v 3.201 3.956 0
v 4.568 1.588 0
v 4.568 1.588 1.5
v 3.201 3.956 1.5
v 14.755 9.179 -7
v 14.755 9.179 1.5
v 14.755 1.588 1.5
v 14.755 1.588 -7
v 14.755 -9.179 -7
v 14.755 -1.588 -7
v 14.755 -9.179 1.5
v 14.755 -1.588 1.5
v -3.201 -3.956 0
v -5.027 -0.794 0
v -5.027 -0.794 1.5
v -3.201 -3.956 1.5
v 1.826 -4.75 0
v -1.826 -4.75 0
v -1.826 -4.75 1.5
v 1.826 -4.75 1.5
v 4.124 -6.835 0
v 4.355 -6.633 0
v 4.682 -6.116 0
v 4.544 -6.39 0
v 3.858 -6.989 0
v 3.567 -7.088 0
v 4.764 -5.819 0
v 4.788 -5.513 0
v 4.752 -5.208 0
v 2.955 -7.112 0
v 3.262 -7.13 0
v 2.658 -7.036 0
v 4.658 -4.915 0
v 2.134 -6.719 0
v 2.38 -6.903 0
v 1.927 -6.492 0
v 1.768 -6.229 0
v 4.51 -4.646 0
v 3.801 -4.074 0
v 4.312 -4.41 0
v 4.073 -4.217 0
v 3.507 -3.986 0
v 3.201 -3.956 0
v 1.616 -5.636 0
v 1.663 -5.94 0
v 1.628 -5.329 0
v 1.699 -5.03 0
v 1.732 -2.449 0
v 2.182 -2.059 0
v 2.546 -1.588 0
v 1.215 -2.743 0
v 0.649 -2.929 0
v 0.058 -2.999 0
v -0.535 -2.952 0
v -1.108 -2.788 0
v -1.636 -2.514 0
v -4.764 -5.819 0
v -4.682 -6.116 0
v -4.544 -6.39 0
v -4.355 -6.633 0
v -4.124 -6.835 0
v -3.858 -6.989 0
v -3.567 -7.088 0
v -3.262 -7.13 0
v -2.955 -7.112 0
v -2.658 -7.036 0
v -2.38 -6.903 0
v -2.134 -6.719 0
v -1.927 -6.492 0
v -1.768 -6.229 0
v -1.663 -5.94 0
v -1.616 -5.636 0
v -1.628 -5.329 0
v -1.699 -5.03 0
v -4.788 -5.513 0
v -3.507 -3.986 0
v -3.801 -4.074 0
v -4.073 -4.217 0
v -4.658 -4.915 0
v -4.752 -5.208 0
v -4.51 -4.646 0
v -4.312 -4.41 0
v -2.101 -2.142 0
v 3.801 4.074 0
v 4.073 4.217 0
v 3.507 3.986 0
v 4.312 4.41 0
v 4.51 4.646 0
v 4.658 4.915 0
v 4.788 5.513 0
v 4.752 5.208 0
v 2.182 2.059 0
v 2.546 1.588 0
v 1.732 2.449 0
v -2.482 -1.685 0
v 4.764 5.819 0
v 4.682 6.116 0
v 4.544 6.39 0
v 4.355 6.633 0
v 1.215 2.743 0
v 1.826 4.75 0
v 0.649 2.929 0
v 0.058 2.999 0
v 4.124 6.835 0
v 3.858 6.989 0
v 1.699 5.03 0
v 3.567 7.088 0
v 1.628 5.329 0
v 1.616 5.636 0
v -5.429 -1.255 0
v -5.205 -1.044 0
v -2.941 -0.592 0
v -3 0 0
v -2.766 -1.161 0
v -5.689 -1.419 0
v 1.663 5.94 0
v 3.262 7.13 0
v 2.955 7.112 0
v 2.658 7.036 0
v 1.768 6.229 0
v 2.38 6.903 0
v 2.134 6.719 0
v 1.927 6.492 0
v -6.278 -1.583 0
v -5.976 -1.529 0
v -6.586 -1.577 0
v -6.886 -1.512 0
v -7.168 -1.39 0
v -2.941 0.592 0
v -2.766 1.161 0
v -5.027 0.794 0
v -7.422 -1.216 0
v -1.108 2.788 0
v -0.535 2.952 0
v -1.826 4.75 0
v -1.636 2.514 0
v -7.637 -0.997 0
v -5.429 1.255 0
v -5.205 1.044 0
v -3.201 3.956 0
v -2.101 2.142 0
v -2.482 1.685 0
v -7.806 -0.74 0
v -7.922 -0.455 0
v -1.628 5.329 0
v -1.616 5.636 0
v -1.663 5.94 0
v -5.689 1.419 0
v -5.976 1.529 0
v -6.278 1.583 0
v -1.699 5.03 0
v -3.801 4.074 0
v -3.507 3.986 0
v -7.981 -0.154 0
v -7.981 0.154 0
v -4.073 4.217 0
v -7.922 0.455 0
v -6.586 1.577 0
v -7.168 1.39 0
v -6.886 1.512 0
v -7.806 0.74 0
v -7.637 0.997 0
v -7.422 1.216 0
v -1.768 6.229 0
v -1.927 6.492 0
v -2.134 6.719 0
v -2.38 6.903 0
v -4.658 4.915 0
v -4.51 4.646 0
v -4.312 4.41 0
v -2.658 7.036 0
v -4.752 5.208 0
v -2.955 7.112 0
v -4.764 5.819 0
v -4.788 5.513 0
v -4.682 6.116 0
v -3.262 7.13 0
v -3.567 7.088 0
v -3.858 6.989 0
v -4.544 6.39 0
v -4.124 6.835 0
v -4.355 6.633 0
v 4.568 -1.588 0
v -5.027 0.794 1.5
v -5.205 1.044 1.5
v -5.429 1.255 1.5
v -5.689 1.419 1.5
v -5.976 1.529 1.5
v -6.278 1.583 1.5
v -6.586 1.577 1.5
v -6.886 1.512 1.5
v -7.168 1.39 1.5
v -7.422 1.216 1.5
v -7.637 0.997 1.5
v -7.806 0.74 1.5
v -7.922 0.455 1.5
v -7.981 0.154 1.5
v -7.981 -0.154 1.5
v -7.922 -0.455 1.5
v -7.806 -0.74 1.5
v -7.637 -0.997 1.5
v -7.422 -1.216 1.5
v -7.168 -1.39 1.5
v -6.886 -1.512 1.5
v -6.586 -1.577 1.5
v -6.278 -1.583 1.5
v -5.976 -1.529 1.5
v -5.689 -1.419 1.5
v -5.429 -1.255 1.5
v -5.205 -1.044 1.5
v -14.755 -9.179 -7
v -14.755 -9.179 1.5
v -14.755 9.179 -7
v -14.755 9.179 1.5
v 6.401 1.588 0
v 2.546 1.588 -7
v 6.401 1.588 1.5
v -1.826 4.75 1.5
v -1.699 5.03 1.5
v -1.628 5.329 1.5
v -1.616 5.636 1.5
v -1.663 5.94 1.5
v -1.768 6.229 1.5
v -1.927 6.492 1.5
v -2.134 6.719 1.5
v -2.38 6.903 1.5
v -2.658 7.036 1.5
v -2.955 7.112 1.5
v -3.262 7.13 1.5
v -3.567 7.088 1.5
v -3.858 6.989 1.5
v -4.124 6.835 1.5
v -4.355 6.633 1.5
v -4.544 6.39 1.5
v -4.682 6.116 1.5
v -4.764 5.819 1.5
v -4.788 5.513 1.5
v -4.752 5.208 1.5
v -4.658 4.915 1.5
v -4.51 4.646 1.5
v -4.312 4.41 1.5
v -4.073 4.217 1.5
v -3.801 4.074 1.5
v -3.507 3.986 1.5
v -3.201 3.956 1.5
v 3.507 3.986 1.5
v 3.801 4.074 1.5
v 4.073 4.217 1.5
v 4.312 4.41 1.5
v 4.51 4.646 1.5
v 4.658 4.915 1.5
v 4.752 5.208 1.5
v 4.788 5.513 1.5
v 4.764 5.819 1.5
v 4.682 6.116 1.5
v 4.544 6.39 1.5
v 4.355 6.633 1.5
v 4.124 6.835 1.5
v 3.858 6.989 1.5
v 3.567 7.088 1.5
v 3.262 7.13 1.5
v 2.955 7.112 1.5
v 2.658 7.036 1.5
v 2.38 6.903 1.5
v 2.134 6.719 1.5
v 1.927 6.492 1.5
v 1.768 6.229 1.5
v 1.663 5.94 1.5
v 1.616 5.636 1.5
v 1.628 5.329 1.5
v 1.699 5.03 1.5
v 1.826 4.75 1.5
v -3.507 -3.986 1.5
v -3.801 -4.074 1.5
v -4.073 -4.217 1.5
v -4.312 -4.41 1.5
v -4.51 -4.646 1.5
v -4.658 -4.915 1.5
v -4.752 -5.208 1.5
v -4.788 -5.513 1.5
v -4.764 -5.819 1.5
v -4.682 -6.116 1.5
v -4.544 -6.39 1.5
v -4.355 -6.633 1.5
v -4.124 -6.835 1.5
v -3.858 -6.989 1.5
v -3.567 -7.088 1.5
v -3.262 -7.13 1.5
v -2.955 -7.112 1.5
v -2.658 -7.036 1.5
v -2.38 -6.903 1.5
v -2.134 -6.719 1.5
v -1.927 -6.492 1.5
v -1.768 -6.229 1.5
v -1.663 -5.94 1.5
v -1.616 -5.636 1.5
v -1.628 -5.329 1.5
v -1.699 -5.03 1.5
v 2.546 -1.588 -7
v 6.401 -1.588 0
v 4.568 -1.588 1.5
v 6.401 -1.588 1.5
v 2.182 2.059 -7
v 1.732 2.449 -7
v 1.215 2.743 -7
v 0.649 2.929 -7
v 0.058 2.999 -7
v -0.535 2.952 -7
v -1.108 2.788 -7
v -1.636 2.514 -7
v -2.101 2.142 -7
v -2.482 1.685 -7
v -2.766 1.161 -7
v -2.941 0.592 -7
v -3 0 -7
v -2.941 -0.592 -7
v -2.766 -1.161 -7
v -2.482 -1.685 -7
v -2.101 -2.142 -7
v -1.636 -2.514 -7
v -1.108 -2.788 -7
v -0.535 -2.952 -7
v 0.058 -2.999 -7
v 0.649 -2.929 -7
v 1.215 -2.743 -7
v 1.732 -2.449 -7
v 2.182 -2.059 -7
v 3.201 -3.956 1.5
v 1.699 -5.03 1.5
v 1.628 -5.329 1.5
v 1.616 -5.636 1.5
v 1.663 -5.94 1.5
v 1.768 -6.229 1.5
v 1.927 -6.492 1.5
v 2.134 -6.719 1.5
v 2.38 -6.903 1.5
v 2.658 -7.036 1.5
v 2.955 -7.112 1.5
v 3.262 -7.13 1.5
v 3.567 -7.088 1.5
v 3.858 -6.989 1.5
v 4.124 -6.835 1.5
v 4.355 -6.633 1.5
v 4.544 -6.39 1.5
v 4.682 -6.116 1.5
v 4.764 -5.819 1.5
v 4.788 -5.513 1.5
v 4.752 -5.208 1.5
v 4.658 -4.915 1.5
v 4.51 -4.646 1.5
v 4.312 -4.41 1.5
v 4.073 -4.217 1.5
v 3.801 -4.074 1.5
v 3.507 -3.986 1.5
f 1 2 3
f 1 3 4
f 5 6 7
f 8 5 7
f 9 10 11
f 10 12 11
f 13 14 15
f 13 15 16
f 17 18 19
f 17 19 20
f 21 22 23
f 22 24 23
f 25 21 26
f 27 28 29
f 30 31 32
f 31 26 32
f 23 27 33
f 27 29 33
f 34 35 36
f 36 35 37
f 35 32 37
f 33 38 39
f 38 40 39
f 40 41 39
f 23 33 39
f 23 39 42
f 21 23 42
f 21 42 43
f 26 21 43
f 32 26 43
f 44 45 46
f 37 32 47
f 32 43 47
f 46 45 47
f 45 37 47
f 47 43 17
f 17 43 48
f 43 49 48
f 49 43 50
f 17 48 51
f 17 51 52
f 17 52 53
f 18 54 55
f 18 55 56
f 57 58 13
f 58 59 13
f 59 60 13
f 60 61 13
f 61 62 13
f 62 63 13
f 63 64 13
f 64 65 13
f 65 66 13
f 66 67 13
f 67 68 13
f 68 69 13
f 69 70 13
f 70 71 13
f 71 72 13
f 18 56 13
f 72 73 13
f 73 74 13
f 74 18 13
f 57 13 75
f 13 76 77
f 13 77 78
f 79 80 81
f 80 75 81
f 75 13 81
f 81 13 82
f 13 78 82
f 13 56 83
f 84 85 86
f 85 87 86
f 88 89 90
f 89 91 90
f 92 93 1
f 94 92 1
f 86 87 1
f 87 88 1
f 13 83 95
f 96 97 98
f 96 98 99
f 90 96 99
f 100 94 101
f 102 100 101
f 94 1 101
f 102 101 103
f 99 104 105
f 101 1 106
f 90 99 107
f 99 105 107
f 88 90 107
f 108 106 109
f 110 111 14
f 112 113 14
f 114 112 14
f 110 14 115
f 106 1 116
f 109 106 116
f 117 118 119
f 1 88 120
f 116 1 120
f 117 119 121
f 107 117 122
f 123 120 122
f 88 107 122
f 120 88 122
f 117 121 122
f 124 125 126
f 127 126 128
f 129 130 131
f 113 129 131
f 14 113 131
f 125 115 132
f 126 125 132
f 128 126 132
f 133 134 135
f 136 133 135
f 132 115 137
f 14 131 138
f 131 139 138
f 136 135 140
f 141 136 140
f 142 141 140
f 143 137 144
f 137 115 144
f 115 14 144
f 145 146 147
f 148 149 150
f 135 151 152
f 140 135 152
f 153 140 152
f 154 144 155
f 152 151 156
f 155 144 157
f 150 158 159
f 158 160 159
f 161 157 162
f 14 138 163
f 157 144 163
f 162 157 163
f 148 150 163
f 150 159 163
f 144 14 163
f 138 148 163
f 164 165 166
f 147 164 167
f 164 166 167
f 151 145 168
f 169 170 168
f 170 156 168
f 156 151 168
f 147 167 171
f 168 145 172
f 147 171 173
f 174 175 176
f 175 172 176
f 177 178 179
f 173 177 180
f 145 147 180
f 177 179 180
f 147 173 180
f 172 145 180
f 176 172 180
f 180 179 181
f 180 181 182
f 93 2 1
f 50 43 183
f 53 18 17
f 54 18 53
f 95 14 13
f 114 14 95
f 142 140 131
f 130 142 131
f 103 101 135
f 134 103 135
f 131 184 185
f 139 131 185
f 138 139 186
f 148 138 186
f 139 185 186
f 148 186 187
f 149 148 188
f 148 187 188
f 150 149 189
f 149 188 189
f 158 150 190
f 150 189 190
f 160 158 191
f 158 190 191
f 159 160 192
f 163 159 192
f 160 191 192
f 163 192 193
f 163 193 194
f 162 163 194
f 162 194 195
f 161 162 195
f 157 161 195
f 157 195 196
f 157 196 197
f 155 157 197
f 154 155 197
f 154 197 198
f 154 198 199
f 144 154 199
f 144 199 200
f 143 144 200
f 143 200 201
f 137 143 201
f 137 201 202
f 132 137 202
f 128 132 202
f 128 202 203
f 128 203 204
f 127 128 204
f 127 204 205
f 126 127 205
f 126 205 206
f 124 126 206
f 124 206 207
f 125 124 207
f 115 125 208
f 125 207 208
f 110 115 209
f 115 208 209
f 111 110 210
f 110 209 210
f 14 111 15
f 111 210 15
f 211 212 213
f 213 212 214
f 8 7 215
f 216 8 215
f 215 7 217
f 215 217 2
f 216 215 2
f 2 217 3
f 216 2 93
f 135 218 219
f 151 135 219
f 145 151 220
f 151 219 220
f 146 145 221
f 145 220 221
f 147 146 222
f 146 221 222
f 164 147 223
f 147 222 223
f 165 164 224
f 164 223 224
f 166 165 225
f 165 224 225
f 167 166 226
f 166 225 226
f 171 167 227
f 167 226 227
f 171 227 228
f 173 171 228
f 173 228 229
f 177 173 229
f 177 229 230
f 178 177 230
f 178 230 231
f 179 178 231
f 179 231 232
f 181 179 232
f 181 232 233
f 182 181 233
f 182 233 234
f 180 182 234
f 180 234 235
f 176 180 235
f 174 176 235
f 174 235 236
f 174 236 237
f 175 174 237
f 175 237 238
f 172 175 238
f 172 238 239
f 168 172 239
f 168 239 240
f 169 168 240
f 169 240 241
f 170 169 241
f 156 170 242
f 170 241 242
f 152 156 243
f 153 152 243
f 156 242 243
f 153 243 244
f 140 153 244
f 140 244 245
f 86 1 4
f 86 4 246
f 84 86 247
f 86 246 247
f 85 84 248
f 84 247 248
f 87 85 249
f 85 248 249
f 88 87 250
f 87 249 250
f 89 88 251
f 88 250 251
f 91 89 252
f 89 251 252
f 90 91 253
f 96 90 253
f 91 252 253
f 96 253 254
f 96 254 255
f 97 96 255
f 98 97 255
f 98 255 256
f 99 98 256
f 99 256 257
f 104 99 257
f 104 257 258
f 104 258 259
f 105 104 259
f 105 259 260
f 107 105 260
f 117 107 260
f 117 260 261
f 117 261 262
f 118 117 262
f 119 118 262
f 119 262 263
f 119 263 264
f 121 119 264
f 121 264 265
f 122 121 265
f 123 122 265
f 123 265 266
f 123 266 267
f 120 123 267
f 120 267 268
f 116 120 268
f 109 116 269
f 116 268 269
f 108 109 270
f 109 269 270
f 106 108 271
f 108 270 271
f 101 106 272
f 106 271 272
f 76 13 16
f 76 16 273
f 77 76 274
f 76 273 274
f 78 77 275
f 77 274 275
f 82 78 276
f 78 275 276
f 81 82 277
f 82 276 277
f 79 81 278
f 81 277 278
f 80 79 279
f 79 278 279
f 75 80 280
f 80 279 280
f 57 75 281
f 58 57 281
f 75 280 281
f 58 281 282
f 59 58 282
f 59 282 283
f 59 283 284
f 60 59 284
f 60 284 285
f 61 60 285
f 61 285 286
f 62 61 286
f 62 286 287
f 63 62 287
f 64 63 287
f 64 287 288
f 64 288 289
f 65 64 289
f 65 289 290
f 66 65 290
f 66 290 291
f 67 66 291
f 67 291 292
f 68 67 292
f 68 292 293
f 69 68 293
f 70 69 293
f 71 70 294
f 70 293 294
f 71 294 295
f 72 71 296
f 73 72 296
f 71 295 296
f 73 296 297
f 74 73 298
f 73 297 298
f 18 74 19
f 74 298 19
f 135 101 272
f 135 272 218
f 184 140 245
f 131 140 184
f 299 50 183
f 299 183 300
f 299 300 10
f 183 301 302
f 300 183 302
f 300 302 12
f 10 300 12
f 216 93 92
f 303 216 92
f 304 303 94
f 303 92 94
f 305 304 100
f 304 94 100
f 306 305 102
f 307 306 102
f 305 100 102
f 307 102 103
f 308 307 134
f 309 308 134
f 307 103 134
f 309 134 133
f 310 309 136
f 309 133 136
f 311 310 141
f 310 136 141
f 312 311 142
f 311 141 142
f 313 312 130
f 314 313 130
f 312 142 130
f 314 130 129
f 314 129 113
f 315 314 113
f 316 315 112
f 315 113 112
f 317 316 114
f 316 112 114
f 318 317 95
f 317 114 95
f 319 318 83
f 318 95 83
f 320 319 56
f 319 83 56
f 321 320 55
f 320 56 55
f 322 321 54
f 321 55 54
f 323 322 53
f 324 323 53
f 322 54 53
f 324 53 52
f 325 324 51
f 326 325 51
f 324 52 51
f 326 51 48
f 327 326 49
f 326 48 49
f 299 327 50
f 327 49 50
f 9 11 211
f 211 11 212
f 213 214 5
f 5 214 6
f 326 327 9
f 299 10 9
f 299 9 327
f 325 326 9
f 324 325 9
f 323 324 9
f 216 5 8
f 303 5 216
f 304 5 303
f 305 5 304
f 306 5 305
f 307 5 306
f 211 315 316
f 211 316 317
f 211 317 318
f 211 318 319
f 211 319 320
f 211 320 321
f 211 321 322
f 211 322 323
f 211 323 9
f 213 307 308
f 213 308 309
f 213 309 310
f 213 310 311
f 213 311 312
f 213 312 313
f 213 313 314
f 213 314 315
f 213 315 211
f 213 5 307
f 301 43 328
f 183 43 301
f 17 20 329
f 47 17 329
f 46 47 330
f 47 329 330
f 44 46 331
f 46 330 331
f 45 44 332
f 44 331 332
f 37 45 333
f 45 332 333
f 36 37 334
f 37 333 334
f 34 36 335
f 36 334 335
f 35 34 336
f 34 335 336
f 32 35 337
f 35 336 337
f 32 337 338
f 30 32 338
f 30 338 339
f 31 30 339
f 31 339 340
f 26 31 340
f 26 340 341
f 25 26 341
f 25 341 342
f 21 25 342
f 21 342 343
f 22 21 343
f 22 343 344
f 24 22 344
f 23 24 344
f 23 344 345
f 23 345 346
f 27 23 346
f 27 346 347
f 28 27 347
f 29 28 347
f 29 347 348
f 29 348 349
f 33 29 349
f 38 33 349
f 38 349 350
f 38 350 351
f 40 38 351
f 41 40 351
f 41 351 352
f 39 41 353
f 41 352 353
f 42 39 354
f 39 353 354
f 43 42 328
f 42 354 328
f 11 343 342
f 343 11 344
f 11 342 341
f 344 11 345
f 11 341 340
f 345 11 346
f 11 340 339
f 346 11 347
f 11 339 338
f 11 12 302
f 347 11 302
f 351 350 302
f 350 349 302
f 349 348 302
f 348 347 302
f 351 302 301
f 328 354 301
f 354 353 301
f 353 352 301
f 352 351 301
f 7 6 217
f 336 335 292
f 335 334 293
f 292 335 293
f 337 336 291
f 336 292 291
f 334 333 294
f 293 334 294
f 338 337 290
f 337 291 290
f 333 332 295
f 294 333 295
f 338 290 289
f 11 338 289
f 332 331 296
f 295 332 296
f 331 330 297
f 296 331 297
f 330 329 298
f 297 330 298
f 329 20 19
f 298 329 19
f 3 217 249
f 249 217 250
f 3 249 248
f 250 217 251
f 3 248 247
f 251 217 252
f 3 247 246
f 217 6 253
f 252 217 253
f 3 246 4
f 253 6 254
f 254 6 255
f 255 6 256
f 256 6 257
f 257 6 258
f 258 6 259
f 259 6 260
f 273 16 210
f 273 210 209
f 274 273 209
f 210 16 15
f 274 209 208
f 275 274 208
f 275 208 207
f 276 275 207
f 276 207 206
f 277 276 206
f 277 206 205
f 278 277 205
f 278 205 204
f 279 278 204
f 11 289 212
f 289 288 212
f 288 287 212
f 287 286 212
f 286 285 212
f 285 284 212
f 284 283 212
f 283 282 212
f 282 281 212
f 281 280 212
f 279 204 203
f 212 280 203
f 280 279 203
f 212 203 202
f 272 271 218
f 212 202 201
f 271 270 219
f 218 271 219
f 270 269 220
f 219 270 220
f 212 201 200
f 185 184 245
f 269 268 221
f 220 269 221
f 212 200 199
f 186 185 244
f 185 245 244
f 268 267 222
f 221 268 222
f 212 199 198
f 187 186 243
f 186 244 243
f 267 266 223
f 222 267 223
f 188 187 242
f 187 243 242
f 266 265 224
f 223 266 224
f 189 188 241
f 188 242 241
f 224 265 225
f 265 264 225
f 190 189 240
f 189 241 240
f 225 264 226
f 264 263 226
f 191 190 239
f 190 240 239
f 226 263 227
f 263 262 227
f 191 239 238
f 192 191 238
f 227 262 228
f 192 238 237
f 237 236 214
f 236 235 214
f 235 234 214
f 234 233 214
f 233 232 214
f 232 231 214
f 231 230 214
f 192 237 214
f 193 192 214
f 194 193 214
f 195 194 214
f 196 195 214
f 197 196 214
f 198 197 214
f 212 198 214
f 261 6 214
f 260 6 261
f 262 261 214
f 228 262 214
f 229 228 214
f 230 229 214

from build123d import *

# Parameters (mm, degrees)
BOSS_EXTRUDE1_DEPTH = 1.5
BOSS_EXTRUDE2_DEPTH = 7
SKETCH5_R           = 1.5875
CUT_EXTRUDE1_DEPTH  = 1.5


with BuildPart() as part:
    # Sketch1 → Boss-Extrude1 (new body)
    with BuildSketch(Plane.XY):
        Polygon((-2.742413779, 4.75), (-5.484827557, 0), (-2.742413779, -4.75), (2.742413779, -4.75), (4.568284005, -1.5875), (14.755382296, -1.5875), (14.755382296, -9.179038244), (-14.755382296, -9.179038244), (-14.755382296, 9.179038244), (14.755382296, 9.179038244), (14.755382296, 1.5875), (4.568284005, 1.5875), (2.742413779, 4.75), align=None)
    extrude(amount=BOSS_EXTRUDE1_DEPTH)

    # Sketch4 → Boss-Extrude2 (add)
    with BuildSketch(Plane(origin=(0, 0, 0), x_dir=(-1, 0, 0), z_dir=(0, 0, -1))):
        with BuildLine():
            Line((-4.568284005, 1.5875), (-2.545553722, 1.5875))
            ThreePointArc((-2.545553722, 1.5875), (3, 0), (-2.545553722, -1.5875))
            Line((-2.545553722, -1.5875), (-4.568284005, -1.5875))
            Line((-4.568284005, -1.5875), (-14.755382296, -1.5875))
            Line((-14.755382296, -1.5875), (-14.755382296, -9.179038244))
            Line((-14.755382296, -9.179038244), (14.755382296, -9.179038244))
            Line((14.755382296, -9.179038244), (14.755382296, 9.179038244))
            Line((14.755382296, 9.179038244), (-14.755382296, 9.179038244))
            Line((-14.755382296, 9.179038244), (-14.755382296, 1.5875))
            Line((-14.755382296, 1.5875), (-4.568284005, 1.5875))
        make_face()
    extrude(amount=BOSS_EXTRUDE2_DEPTH)

    # Sketch5 → Cut-Extrude1 (cut)
    with BuildSketch(Plane.XY.offset(1.5)):
        with Locations((3.200685555, 5.54375)):
            Circle(SKETCH5_R)
        with Locations((6.40137111, 0)):
            Circle(SKETCH5_R)
        with Locations((3.200685555, -5.54375)):
            Circle(SKETCH5_R)
        with Locations((-3.200685555, -5.54375)):
            Circle(SKETCH5_R)
        with Locations((-6.40137111, 0)):
            Circle(SKETCH5_R)
        with Locations((-3.200685555, 5.54375)):
            Circle(SKETCH5_R)
    extrude(amount=-CUT_EXTRUDE1_DEPTH, mode=Mode.SUBTRACT)


solid = part.part
